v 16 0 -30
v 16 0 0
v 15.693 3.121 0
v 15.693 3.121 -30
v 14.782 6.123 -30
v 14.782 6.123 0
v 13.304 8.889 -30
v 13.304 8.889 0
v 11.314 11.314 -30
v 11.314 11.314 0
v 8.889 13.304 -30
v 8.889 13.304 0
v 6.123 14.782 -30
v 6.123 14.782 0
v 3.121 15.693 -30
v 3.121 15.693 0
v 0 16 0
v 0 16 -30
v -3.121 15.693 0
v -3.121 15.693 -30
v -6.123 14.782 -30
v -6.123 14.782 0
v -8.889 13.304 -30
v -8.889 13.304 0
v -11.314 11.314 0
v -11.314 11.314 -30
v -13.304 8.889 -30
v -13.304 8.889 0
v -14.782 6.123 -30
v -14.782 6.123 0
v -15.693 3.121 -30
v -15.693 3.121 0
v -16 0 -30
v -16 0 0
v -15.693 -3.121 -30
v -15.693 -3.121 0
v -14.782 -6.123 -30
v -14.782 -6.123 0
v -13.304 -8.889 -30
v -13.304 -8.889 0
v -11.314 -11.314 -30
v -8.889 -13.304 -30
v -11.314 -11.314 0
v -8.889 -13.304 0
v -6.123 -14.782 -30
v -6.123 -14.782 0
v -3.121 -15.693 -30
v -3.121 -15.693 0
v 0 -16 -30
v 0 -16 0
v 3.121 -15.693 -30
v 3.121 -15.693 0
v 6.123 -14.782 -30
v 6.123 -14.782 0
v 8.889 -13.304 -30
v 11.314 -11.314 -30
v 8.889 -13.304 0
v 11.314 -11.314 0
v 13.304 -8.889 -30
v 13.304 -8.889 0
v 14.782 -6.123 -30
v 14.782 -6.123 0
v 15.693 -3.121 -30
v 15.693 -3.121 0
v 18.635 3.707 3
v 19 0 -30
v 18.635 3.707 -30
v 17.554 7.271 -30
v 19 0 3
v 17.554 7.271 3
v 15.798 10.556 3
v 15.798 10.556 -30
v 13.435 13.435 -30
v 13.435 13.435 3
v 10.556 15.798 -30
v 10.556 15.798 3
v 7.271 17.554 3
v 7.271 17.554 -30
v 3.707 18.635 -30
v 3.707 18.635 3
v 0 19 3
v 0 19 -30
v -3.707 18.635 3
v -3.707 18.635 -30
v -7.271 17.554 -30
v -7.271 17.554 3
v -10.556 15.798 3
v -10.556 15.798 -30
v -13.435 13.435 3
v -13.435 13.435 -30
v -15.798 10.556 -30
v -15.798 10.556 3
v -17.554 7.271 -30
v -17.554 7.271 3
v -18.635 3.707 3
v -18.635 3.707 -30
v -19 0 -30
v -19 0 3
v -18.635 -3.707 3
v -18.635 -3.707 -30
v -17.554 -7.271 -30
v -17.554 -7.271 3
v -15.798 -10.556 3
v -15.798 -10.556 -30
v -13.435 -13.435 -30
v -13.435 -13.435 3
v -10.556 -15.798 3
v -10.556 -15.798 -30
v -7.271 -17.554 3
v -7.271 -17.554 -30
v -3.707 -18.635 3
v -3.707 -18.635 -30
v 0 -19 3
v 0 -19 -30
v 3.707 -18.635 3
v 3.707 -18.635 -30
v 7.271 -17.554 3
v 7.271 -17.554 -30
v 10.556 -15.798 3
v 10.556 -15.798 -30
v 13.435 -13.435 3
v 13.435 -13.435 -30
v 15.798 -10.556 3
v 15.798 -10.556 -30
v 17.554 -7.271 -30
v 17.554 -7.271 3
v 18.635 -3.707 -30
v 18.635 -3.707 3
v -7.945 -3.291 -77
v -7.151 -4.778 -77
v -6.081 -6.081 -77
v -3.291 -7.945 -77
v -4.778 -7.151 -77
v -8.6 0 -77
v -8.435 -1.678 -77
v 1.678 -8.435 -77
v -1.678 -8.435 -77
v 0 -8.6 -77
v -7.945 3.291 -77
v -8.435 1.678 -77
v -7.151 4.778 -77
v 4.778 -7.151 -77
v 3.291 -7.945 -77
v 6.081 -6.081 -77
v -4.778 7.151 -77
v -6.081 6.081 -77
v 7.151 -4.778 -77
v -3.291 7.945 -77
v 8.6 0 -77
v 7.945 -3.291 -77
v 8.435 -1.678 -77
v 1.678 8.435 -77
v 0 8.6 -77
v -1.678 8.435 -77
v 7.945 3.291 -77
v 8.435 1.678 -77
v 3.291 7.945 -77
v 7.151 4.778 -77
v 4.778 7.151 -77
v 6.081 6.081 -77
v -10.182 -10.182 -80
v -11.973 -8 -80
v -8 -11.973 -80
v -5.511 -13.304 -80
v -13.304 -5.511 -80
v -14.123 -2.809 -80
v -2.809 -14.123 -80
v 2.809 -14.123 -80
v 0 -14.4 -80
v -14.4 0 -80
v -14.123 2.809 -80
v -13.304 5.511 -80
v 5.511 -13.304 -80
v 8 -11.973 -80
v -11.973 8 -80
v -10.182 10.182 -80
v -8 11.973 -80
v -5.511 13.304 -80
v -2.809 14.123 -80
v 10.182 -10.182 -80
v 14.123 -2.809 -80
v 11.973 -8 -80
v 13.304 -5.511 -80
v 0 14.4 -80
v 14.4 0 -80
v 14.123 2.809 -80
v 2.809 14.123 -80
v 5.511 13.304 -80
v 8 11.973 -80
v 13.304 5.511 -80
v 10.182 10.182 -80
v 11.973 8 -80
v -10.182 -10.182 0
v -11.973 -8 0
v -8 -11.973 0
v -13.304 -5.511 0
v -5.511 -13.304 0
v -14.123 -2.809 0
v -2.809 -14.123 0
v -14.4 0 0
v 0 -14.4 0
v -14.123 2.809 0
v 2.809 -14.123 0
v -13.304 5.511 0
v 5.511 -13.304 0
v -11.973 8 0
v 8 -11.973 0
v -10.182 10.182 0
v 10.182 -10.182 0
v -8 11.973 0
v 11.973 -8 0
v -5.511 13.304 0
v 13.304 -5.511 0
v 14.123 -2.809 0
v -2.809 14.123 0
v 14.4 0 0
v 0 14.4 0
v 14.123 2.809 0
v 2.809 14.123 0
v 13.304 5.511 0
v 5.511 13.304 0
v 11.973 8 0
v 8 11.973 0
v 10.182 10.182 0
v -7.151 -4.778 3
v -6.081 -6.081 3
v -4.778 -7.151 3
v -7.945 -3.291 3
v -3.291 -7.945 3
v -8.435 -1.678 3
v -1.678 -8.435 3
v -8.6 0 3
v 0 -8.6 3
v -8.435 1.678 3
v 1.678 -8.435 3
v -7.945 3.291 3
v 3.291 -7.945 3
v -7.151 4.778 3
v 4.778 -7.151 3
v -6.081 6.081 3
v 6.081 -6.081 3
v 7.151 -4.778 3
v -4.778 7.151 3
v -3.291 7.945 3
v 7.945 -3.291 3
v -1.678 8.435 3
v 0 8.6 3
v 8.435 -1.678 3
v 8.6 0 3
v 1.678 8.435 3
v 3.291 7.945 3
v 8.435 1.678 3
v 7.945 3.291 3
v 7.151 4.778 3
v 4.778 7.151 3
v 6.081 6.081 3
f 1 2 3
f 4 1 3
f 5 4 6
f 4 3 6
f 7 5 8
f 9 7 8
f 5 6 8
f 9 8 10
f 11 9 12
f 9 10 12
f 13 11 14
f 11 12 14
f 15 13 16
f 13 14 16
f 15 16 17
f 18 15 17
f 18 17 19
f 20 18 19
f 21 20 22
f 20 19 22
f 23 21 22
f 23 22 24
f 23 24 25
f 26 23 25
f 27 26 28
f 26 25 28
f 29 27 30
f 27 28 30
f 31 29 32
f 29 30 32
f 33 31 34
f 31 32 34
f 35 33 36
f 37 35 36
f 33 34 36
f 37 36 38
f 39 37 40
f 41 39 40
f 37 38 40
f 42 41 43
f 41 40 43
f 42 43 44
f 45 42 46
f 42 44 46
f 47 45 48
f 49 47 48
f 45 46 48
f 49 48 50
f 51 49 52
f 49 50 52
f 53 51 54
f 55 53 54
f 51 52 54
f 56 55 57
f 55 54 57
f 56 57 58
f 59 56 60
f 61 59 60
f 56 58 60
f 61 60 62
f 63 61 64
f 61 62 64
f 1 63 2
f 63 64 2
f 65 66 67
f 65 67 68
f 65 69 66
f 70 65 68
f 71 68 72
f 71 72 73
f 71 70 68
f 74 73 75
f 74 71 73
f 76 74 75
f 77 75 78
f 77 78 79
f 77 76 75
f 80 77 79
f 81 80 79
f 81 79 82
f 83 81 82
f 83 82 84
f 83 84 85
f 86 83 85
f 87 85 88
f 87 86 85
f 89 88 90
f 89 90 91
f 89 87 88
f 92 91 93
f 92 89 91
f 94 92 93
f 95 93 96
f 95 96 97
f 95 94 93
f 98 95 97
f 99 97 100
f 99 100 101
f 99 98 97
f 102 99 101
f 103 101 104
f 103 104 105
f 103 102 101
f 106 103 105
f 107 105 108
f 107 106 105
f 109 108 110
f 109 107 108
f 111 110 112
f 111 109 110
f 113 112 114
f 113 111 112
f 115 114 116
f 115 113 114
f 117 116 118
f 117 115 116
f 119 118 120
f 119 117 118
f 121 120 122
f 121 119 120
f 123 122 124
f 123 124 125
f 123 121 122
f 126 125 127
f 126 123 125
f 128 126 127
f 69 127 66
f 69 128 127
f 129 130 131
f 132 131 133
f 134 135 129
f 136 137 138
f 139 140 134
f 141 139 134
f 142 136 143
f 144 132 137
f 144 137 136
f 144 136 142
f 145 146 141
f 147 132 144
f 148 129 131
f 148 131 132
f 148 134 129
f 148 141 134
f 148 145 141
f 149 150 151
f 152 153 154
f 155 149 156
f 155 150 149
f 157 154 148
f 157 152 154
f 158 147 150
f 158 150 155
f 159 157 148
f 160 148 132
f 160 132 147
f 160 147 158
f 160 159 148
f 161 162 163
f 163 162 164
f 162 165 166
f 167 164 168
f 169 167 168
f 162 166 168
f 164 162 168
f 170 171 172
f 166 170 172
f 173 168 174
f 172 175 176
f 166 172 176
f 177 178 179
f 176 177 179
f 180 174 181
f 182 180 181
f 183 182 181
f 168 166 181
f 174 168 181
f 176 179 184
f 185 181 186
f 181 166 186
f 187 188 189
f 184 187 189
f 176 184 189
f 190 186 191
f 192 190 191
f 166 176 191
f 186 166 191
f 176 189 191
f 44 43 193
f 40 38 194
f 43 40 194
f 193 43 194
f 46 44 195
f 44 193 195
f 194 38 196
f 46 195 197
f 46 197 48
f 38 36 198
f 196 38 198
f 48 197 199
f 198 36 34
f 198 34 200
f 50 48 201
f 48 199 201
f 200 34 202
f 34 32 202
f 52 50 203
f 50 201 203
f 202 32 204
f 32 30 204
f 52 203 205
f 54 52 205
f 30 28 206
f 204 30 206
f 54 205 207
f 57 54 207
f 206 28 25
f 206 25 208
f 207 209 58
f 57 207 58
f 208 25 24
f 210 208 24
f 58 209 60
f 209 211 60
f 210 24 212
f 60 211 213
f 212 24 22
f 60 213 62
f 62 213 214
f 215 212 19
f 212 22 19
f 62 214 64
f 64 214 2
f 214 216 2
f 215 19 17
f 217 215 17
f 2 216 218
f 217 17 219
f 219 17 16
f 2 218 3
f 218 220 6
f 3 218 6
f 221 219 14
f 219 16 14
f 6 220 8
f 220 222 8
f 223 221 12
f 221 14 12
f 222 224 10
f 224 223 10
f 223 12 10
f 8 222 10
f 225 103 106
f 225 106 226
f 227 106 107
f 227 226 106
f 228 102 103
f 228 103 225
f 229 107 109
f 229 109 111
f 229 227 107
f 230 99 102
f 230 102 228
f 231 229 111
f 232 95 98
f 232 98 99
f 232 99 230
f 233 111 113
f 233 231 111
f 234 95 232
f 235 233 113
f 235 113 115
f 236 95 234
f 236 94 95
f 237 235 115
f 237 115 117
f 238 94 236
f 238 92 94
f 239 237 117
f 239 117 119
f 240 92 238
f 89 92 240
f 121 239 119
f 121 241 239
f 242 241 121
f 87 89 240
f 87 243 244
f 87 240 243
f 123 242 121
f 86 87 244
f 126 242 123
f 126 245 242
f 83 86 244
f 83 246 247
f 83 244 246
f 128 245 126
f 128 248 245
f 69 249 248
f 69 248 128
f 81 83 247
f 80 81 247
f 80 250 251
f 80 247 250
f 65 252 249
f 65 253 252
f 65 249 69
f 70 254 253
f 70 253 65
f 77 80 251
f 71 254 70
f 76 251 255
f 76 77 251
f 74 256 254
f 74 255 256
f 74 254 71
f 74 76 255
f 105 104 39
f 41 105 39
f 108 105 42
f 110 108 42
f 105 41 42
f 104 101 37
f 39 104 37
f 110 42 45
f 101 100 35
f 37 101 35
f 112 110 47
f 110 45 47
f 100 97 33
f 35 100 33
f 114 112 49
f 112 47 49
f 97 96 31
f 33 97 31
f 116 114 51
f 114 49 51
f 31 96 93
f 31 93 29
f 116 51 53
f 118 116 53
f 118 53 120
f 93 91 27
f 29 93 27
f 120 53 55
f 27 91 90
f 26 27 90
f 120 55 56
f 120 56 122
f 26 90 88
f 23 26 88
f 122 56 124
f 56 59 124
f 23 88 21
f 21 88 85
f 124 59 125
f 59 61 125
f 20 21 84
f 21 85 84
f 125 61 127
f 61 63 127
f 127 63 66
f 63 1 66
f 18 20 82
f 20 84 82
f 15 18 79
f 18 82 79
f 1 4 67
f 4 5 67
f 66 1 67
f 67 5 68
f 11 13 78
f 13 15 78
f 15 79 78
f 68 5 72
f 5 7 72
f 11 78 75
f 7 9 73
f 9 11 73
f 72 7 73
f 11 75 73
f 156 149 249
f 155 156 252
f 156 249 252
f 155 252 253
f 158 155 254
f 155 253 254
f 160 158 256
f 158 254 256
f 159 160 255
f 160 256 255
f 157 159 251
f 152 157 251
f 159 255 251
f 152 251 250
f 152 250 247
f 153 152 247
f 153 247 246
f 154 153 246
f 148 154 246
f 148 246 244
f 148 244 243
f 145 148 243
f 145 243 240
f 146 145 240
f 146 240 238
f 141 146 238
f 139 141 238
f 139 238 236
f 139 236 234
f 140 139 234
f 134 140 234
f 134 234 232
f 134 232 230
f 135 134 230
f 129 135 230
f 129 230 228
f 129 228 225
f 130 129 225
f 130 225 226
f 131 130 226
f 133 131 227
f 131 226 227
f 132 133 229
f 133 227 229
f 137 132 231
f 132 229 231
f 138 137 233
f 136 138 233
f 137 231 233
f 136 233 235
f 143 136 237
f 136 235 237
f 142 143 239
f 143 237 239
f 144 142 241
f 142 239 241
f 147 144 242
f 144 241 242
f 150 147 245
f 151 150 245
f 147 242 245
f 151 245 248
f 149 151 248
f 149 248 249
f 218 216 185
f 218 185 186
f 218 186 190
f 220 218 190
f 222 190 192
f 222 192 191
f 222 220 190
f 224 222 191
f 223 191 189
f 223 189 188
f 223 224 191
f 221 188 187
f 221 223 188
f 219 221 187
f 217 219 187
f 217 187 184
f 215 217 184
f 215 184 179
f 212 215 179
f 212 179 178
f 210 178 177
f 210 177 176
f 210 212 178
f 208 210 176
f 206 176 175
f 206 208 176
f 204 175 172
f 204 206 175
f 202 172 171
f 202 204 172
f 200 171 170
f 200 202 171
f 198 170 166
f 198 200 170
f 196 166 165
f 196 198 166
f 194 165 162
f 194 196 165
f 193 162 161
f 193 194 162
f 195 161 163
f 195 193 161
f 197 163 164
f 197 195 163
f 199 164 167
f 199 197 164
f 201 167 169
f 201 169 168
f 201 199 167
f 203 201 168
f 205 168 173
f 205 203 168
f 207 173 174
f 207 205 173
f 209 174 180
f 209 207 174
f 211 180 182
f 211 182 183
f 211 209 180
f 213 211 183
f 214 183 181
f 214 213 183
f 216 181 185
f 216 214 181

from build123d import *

# Parameters (mm, degrees)
SKETCH_1_R      = 14.4
SKETCH_1_R_2    = 8.6
EXTRUDE_1_DEPTH = 80
EXTRUDE_START   = 3
SKETCH_1_3_R    = 19
SKETCH_1_3_R_2  = 16
SKETCH_1_3_R_3  = 14.4
SKETCH_1_3_R_4  = 8.6
EXTRUDE_2_DEPTH = 3
SKETCH_1_5_R    = 19
SKETCH_1_5_R_2  = 16
EXTRUDE_3_DEPTH = 30
EXTRUDE_START_2 = -77
SKETCH_1_6_R    = 8.6
EXTRUDE_4_DEPTH = 3


with BuildPart() as part:
    # Эскиз1 → Бобышка-Вытянуть1 (new body)
    with BuildSketch(Plane.XY):
        Circle(SKETCH_1_R)
        Circle(SKETCH_1_R_2, mode=Mode.SUBTRACT)
    extrude(amount=-EXTRUDE_1_DEPTH)

    # Эскиз1<3> → Бобышка-Вытянуть2 (add)
    # profile 1 of 3: a face of its own
    with BuildSketch(Plane.XY.offset(EXTRUDE_START)):
        Circle(SKETCH_1_3_R)
        Circle(SKETCH_1_3_R_2, mode=Mode.SUBTRACT)
    # profile 2 of 3: a face of its own
    with BuildSketch(Plane.XY.offset(EXTRUDE_START)):
        Circle(SKETCH_1_3_R_2)
        Circle(SKETCH_1_3_R_3, mode=Mode.SUBTRACT)
    # profile 3 of 3: a face of its own
    with BuildSketch(Plane.XY.offset(EXTRUDE_START)):
        Circle(SKETCH_1_3_R_3)
        Circle(SKETCH_1_3_R_4, mode=Mode.SUBTRACT)
    extrude(amount=-EXTRUDE_2_DEPTH)

    # Эскиз1<5> → Бобышка-Вытянуть3 (add)
    with BuildSketch(Plane.XY):
        Circle(SKETCH_1_5_R)
        Circle(SKETCH_1_5_R_2, mode=Mode.SUBTRACT)
    extrude(amount=-EXTRUDE_3_DEPTH)

    # Эскиз1<6> → Бобышка-Вытянуть4 (add)
    with BuildSketch(Plane.XY.offset(EXTRUDE_START_2)):
        Circle(SKETCH_1_6_R)
    extrude(amount=-EXTRUDE_4_DEPTH)


solid = part.part
